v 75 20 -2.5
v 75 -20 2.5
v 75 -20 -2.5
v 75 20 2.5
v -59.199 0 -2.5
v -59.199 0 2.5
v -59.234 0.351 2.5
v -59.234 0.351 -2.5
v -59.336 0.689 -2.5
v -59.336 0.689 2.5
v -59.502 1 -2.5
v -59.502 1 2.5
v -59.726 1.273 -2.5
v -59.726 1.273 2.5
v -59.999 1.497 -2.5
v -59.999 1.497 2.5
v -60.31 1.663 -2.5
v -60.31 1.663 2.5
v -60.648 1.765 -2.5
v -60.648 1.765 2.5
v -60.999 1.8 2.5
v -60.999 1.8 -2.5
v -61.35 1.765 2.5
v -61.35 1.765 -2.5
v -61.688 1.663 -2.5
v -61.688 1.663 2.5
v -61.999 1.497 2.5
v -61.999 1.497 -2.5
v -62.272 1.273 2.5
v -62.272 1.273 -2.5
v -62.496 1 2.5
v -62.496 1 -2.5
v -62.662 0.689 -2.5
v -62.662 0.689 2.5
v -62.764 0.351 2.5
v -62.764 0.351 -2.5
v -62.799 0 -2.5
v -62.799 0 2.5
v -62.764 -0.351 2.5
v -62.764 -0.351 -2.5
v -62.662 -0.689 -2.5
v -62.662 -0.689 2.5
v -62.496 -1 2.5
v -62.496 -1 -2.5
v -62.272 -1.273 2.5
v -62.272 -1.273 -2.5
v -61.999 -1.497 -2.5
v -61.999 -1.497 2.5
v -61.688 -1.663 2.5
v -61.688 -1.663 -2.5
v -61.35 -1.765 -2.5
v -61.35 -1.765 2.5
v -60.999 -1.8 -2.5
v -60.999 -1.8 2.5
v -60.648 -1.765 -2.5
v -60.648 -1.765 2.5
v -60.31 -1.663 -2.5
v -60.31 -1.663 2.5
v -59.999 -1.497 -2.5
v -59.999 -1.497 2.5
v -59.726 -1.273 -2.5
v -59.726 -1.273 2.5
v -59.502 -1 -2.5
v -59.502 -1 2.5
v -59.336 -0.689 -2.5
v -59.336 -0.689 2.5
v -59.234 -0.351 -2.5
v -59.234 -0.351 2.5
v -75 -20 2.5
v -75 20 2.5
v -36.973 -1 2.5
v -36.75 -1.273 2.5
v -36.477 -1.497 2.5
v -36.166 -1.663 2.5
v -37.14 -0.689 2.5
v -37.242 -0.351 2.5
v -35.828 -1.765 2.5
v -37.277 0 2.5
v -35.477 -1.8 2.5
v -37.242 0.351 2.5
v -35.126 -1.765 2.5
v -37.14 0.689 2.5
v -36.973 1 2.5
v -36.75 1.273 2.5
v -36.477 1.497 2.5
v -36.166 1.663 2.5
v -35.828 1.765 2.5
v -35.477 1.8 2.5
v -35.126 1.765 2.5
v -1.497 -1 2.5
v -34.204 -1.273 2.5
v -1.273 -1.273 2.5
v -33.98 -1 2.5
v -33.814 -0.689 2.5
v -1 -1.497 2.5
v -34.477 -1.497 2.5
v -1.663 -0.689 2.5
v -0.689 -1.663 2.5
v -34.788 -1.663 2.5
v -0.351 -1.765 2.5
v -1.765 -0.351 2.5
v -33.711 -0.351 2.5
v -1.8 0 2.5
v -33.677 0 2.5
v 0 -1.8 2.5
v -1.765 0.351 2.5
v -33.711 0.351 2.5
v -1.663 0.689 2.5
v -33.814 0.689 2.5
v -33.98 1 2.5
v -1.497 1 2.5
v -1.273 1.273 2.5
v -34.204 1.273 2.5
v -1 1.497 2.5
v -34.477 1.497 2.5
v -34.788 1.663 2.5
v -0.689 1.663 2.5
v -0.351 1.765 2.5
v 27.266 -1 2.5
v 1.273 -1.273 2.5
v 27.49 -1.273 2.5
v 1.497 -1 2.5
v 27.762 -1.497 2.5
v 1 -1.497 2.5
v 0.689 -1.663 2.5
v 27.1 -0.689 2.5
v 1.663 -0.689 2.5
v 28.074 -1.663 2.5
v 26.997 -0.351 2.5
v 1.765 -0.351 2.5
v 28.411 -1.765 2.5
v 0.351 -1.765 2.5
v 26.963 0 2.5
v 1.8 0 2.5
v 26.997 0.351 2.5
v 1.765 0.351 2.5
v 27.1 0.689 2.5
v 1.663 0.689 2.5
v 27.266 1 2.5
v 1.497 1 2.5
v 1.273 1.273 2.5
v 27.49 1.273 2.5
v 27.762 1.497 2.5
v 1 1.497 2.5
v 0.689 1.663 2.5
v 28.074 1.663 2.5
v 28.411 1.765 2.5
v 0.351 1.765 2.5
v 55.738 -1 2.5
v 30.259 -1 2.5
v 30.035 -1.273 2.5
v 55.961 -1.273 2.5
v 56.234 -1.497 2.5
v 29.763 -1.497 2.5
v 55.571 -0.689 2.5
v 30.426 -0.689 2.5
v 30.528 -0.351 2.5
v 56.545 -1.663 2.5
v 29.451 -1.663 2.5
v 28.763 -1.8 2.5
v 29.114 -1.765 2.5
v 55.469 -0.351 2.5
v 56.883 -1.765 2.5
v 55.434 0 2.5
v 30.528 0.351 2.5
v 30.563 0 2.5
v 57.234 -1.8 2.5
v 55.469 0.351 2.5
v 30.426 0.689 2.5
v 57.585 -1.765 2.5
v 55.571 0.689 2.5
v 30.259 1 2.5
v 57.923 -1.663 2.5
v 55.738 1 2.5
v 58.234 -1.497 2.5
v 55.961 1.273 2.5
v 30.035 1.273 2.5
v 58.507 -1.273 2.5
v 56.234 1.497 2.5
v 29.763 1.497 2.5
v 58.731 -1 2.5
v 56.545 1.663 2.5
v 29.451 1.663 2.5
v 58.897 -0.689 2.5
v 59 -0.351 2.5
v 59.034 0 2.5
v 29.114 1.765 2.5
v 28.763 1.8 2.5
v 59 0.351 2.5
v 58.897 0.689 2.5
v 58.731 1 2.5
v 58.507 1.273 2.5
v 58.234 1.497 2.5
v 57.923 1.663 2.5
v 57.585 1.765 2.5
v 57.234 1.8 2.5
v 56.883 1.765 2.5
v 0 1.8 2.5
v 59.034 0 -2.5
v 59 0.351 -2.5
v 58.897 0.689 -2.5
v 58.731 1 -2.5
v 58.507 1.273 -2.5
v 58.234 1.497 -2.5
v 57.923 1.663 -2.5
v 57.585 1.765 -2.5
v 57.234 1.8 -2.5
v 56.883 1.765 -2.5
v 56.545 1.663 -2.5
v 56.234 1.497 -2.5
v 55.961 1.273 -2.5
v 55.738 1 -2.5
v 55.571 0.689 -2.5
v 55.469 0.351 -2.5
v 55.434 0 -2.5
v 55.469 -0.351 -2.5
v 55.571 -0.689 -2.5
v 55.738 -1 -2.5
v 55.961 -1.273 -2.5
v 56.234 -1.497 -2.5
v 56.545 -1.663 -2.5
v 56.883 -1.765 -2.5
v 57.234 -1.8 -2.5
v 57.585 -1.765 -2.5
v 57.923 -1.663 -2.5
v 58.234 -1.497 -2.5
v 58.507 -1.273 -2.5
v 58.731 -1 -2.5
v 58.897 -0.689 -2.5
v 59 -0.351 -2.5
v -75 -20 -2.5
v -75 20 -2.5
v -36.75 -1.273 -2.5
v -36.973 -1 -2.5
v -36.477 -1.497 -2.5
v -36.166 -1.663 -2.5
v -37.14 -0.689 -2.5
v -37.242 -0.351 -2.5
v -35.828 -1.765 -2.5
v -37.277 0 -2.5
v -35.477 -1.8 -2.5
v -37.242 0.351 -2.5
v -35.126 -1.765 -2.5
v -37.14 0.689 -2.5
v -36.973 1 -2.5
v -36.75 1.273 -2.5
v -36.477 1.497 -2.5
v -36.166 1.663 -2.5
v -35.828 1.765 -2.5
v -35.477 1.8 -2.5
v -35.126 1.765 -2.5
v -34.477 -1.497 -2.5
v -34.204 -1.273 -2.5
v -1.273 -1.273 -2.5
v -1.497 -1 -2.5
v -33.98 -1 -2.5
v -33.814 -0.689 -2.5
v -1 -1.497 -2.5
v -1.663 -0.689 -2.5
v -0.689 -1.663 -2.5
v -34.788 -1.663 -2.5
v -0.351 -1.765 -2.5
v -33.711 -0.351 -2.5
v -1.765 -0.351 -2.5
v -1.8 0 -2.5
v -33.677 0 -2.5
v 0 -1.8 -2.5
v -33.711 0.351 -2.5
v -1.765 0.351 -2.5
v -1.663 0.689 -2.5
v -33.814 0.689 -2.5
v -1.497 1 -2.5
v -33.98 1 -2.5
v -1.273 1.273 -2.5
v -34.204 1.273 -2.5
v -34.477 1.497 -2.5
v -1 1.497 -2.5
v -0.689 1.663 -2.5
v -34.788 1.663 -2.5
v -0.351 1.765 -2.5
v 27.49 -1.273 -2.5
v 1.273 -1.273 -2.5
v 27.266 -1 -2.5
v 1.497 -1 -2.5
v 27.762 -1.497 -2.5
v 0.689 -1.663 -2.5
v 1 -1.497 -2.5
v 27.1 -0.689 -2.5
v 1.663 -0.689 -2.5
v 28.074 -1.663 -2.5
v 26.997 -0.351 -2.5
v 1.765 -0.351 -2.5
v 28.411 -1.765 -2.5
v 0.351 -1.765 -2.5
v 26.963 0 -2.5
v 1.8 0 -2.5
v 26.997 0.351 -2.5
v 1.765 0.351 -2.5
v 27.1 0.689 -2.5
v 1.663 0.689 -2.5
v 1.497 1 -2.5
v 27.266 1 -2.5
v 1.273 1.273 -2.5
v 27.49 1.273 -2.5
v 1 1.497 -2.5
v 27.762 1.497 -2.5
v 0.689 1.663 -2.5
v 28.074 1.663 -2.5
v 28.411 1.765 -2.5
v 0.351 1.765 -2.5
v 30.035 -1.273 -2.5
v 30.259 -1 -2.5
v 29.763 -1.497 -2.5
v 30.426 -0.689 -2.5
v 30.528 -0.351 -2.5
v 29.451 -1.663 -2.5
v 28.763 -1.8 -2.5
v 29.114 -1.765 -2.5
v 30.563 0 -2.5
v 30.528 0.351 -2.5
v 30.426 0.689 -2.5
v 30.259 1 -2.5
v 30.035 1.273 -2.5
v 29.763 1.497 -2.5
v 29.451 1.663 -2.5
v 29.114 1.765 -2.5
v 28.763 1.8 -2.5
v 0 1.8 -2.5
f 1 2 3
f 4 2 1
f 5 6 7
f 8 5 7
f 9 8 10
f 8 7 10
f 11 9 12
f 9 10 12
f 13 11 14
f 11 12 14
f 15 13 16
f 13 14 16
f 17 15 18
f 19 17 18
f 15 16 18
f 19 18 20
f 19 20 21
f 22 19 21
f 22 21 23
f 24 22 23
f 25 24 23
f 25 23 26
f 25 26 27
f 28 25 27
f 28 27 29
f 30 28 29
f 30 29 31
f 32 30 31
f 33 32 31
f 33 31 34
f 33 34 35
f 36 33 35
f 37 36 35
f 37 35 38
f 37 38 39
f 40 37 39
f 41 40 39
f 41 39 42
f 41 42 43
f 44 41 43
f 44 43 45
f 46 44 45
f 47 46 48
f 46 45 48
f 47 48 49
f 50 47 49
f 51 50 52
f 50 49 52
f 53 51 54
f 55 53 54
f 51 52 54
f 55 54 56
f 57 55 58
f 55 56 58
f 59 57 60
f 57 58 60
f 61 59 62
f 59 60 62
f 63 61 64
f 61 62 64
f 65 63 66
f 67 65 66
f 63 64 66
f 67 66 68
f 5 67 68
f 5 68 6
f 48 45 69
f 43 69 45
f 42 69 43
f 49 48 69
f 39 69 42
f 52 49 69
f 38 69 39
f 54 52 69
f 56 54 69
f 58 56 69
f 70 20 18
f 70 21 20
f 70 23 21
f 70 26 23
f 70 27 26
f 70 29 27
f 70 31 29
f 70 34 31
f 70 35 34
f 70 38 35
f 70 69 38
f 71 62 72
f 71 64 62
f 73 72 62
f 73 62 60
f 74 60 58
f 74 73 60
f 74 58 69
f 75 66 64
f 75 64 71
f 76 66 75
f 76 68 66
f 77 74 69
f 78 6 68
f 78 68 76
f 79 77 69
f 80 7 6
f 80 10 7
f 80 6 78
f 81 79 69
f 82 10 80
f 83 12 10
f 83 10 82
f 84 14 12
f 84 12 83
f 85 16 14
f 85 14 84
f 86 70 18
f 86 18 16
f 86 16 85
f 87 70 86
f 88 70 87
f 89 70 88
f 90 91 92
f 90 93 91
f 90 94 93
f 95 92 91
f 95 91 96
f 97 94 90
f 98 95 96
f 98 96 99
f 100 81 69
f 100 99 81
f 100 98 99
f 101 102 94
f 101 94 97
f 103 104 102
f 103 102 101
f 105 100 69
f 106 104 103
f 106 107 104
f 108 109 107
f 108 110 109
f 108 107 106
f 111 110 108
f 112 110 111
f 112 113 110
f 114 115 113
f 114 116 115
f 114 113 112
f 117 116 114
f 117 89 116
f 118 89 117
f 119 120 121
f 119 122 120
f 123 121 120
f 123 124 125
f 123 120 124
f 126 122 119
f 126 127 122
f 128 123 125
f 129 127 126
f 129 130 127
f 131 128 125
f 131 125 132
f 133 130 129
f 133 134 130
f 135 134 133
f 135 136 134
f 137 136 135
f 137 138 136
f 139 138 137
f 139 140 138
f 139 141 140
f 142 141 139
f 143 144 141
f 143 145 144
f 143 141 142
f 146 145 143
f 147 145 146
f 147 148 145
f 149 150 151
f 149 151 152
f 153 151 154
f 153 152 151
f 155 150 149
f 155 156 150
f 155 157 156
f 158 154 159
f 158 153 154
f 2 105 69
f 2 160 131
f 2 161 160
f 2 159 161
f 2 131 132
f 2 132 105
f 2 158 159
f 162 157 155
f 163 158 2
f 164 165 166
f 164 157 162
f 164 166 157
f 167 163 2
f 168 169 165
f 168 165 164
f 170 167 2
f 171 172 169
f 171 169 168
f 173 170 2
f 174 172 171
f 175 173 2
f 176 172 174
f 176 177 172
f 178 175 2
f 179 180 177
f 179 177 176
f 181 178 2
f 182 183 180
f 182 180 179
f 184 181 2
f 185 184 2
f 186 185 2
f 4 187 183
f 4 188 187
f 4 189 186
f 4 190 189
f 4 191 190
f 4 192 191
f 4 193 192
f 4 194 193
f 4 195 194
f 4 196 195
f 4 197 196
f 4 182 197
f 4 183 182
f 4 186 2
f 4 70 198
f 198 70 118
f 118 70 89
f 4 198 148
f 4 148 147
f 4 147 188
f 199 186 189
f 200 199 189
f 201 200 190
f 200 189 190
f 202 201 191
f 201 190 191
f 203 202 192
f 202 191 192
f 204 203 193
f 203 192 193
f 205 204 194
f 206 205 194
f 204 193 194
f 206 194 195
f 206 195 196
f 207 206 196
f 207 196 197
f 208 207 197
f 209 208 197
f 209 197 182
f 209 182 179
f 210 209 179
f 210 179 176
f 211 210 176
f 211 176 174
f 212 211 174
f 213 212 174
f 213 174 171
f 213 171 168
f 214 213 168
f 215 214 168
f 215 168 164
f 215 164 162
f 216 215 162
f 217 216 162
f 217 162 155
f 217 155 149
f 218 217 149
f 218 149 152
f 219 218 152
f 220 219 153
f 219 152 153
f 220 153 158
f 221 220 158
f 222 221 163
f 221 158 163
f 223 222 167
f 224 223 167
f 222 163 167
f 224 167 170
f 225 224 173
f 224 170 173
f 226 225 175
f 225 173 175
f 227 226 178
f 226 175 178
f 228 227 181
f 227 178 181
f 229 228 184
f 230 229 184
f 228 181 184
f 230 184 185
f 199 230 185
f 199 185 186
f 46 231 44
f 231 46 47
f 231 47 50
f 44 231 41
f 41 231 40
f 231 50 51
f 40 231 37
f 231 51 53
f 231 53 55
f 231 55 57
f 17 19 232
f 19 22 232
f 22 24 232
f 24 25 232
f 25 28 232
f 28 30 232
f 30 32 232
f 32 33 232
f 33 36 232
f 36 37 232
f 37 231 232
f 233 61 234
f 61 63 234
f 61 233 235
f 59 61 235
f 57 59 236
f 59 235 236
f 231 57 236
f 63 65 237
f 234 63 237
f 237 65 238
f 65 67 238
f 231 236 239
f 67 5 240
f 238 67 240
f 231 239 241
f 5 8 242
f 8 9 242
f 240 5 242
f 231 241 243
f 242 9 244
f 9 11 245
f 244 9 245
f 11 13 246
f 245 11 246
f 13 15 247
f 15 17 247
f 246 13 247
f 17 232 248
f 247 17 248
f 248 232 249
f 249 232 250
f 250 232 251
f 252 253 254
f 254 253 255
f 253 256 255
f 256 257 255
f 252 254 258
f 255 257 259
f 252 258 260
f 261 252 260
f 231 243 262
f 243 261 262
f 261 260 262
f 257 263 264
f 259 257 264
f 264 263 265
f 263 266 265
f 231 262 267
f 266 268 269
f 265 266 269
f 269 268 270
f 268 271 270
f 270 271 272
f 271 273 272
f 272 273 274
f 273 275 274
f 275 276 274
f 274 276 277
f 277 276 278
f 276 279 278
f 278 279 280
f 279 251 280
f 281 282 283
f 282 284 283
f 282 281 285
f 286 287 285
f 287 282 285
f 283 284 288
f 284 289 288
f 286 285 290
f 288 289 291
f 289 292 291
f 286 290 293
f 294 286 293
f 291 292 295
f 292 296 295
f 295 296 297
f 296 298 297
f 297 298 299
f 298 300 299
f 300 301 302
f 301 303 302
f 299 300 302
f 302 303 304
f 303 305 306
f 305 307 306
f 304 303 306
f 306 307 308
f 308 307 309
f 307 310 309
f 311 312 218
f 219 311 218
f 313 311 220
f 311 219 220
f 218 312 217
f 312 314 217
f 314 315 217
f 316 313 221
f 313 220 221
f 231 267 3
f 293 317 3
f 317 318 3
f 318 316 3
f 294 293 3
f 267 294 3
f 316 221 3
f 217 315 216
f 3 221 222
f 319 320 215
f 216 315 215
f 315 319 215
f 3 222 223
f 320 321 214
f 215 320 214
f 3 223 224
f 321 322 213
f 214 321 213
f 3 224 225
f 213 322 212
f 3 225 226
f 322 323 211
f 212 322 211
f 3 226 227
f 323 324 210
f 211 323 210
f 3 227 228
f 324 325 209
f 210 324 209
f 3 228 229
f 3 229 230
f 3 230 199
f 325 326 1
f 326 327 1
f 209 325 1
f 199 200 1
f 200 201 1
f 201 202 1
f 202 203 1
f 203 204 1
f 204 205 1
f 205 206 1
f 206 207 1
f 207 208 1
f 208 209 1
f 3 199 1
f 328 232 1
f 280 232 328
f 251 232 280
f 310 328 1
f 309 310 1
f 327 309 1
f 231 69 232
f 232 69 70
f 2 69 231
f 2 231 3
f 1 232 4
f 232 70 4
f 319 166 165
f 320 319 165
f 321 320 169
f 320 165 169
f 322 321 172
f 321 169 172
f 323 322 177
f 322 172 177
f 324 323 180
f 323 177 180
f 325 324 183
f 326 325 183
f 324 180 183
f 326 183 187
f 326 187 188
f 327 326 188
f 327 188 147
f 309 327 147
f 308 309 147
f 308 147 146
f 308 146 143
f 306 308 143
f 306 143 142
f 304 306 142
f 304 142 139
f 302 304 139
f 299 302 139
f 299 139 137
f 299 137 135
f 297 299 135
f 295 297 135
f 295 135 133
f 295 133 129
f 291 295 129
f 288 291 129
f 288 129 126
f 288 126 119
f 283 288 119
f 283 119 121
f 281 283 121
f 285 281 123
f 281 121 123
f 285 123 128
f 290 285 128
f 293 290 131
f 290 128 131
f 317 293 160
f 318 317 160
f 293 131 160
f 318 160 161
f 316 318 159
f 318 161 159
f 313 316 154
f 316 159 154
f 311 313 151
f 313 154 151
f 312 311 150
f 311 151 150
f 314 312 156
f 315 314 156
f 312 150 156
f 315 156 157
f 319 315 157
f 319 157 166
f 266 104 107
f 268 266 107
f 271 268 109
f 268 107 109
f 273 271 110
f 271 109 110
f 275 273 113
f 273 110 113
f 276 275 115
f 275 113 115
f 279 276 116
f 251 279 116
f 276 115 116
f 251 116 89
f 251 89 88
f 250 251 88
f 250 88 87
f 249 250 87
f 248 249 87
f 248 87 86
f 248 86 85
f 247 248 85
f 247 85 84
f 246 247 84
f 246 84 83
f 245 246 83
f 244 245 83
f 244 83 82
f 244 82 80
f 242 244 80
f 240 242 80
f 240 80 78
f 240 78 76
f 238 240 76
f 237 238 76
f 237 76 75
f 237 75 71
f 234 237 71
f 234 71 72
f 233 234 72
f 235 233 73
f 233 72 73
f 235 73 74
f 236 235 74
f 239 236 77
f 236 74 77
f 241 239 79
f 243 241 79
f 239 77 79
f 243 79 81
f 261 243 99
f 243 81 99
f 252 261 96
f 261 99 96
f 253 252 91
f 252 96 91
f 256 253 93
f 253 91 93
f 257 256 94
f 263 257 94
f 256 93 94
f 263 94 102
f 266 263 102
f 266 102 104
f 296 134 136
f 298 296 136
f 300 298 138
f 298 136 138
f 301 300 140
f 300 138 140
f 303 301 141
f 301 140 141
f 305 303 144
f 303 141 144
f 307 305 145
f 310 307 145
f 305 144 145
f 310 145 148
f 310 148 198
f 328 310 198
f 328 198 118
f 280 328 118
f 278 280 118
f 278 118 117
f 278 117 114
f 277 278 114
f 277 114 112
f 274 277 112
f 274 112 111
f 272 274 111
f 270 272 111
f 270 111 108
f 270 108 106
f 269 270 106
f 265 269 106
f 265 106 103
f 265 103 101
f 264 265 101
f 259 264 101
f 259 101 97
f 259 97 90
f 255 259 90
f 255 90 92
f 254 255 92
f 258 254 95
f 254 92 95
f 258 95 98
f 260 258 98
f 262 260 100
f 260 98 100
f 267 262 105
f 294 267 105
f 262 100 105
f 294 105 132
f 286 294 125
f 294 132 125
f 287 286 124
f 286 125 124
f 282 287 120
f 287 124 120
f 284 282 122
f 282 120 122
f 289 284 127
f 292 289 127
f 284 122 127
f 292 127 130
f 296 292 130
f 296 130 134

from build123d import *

# Parameters (mm, degrees)
F0_W     = 150
F0_H     = 40
F1_DEPTH = 2.5
F2_R     = 1.8
F3_DEPTH = 8


with BuildPart() as f1:
    # F0 (on Top) → F1 (new body, symmetric)
    with BuildSketch(Plane.XY):
        Rectangle(F0_W, F0_H)
    extrude(amount=F1_DEPTH, both=True)

    # F2 (on face) → F3 (cut)
    with BuildSketch(Plane.XY.offset(2.5)):
        with Locations((57.234262, 0)):
            Circle(F2_R)
        with Locations((28.762519, 0)):
            Circle(F2_R)
        Circle(F2_R)
        with Locations((-35.476741, 0)):
            Circle(F2_R)
        with Locations((-60.998922, 0)):
            Circle(F2_R)
    extrude(amount=-F3_DEPTH, mode=Mode.SUBTRACT)


solid = f1.part
